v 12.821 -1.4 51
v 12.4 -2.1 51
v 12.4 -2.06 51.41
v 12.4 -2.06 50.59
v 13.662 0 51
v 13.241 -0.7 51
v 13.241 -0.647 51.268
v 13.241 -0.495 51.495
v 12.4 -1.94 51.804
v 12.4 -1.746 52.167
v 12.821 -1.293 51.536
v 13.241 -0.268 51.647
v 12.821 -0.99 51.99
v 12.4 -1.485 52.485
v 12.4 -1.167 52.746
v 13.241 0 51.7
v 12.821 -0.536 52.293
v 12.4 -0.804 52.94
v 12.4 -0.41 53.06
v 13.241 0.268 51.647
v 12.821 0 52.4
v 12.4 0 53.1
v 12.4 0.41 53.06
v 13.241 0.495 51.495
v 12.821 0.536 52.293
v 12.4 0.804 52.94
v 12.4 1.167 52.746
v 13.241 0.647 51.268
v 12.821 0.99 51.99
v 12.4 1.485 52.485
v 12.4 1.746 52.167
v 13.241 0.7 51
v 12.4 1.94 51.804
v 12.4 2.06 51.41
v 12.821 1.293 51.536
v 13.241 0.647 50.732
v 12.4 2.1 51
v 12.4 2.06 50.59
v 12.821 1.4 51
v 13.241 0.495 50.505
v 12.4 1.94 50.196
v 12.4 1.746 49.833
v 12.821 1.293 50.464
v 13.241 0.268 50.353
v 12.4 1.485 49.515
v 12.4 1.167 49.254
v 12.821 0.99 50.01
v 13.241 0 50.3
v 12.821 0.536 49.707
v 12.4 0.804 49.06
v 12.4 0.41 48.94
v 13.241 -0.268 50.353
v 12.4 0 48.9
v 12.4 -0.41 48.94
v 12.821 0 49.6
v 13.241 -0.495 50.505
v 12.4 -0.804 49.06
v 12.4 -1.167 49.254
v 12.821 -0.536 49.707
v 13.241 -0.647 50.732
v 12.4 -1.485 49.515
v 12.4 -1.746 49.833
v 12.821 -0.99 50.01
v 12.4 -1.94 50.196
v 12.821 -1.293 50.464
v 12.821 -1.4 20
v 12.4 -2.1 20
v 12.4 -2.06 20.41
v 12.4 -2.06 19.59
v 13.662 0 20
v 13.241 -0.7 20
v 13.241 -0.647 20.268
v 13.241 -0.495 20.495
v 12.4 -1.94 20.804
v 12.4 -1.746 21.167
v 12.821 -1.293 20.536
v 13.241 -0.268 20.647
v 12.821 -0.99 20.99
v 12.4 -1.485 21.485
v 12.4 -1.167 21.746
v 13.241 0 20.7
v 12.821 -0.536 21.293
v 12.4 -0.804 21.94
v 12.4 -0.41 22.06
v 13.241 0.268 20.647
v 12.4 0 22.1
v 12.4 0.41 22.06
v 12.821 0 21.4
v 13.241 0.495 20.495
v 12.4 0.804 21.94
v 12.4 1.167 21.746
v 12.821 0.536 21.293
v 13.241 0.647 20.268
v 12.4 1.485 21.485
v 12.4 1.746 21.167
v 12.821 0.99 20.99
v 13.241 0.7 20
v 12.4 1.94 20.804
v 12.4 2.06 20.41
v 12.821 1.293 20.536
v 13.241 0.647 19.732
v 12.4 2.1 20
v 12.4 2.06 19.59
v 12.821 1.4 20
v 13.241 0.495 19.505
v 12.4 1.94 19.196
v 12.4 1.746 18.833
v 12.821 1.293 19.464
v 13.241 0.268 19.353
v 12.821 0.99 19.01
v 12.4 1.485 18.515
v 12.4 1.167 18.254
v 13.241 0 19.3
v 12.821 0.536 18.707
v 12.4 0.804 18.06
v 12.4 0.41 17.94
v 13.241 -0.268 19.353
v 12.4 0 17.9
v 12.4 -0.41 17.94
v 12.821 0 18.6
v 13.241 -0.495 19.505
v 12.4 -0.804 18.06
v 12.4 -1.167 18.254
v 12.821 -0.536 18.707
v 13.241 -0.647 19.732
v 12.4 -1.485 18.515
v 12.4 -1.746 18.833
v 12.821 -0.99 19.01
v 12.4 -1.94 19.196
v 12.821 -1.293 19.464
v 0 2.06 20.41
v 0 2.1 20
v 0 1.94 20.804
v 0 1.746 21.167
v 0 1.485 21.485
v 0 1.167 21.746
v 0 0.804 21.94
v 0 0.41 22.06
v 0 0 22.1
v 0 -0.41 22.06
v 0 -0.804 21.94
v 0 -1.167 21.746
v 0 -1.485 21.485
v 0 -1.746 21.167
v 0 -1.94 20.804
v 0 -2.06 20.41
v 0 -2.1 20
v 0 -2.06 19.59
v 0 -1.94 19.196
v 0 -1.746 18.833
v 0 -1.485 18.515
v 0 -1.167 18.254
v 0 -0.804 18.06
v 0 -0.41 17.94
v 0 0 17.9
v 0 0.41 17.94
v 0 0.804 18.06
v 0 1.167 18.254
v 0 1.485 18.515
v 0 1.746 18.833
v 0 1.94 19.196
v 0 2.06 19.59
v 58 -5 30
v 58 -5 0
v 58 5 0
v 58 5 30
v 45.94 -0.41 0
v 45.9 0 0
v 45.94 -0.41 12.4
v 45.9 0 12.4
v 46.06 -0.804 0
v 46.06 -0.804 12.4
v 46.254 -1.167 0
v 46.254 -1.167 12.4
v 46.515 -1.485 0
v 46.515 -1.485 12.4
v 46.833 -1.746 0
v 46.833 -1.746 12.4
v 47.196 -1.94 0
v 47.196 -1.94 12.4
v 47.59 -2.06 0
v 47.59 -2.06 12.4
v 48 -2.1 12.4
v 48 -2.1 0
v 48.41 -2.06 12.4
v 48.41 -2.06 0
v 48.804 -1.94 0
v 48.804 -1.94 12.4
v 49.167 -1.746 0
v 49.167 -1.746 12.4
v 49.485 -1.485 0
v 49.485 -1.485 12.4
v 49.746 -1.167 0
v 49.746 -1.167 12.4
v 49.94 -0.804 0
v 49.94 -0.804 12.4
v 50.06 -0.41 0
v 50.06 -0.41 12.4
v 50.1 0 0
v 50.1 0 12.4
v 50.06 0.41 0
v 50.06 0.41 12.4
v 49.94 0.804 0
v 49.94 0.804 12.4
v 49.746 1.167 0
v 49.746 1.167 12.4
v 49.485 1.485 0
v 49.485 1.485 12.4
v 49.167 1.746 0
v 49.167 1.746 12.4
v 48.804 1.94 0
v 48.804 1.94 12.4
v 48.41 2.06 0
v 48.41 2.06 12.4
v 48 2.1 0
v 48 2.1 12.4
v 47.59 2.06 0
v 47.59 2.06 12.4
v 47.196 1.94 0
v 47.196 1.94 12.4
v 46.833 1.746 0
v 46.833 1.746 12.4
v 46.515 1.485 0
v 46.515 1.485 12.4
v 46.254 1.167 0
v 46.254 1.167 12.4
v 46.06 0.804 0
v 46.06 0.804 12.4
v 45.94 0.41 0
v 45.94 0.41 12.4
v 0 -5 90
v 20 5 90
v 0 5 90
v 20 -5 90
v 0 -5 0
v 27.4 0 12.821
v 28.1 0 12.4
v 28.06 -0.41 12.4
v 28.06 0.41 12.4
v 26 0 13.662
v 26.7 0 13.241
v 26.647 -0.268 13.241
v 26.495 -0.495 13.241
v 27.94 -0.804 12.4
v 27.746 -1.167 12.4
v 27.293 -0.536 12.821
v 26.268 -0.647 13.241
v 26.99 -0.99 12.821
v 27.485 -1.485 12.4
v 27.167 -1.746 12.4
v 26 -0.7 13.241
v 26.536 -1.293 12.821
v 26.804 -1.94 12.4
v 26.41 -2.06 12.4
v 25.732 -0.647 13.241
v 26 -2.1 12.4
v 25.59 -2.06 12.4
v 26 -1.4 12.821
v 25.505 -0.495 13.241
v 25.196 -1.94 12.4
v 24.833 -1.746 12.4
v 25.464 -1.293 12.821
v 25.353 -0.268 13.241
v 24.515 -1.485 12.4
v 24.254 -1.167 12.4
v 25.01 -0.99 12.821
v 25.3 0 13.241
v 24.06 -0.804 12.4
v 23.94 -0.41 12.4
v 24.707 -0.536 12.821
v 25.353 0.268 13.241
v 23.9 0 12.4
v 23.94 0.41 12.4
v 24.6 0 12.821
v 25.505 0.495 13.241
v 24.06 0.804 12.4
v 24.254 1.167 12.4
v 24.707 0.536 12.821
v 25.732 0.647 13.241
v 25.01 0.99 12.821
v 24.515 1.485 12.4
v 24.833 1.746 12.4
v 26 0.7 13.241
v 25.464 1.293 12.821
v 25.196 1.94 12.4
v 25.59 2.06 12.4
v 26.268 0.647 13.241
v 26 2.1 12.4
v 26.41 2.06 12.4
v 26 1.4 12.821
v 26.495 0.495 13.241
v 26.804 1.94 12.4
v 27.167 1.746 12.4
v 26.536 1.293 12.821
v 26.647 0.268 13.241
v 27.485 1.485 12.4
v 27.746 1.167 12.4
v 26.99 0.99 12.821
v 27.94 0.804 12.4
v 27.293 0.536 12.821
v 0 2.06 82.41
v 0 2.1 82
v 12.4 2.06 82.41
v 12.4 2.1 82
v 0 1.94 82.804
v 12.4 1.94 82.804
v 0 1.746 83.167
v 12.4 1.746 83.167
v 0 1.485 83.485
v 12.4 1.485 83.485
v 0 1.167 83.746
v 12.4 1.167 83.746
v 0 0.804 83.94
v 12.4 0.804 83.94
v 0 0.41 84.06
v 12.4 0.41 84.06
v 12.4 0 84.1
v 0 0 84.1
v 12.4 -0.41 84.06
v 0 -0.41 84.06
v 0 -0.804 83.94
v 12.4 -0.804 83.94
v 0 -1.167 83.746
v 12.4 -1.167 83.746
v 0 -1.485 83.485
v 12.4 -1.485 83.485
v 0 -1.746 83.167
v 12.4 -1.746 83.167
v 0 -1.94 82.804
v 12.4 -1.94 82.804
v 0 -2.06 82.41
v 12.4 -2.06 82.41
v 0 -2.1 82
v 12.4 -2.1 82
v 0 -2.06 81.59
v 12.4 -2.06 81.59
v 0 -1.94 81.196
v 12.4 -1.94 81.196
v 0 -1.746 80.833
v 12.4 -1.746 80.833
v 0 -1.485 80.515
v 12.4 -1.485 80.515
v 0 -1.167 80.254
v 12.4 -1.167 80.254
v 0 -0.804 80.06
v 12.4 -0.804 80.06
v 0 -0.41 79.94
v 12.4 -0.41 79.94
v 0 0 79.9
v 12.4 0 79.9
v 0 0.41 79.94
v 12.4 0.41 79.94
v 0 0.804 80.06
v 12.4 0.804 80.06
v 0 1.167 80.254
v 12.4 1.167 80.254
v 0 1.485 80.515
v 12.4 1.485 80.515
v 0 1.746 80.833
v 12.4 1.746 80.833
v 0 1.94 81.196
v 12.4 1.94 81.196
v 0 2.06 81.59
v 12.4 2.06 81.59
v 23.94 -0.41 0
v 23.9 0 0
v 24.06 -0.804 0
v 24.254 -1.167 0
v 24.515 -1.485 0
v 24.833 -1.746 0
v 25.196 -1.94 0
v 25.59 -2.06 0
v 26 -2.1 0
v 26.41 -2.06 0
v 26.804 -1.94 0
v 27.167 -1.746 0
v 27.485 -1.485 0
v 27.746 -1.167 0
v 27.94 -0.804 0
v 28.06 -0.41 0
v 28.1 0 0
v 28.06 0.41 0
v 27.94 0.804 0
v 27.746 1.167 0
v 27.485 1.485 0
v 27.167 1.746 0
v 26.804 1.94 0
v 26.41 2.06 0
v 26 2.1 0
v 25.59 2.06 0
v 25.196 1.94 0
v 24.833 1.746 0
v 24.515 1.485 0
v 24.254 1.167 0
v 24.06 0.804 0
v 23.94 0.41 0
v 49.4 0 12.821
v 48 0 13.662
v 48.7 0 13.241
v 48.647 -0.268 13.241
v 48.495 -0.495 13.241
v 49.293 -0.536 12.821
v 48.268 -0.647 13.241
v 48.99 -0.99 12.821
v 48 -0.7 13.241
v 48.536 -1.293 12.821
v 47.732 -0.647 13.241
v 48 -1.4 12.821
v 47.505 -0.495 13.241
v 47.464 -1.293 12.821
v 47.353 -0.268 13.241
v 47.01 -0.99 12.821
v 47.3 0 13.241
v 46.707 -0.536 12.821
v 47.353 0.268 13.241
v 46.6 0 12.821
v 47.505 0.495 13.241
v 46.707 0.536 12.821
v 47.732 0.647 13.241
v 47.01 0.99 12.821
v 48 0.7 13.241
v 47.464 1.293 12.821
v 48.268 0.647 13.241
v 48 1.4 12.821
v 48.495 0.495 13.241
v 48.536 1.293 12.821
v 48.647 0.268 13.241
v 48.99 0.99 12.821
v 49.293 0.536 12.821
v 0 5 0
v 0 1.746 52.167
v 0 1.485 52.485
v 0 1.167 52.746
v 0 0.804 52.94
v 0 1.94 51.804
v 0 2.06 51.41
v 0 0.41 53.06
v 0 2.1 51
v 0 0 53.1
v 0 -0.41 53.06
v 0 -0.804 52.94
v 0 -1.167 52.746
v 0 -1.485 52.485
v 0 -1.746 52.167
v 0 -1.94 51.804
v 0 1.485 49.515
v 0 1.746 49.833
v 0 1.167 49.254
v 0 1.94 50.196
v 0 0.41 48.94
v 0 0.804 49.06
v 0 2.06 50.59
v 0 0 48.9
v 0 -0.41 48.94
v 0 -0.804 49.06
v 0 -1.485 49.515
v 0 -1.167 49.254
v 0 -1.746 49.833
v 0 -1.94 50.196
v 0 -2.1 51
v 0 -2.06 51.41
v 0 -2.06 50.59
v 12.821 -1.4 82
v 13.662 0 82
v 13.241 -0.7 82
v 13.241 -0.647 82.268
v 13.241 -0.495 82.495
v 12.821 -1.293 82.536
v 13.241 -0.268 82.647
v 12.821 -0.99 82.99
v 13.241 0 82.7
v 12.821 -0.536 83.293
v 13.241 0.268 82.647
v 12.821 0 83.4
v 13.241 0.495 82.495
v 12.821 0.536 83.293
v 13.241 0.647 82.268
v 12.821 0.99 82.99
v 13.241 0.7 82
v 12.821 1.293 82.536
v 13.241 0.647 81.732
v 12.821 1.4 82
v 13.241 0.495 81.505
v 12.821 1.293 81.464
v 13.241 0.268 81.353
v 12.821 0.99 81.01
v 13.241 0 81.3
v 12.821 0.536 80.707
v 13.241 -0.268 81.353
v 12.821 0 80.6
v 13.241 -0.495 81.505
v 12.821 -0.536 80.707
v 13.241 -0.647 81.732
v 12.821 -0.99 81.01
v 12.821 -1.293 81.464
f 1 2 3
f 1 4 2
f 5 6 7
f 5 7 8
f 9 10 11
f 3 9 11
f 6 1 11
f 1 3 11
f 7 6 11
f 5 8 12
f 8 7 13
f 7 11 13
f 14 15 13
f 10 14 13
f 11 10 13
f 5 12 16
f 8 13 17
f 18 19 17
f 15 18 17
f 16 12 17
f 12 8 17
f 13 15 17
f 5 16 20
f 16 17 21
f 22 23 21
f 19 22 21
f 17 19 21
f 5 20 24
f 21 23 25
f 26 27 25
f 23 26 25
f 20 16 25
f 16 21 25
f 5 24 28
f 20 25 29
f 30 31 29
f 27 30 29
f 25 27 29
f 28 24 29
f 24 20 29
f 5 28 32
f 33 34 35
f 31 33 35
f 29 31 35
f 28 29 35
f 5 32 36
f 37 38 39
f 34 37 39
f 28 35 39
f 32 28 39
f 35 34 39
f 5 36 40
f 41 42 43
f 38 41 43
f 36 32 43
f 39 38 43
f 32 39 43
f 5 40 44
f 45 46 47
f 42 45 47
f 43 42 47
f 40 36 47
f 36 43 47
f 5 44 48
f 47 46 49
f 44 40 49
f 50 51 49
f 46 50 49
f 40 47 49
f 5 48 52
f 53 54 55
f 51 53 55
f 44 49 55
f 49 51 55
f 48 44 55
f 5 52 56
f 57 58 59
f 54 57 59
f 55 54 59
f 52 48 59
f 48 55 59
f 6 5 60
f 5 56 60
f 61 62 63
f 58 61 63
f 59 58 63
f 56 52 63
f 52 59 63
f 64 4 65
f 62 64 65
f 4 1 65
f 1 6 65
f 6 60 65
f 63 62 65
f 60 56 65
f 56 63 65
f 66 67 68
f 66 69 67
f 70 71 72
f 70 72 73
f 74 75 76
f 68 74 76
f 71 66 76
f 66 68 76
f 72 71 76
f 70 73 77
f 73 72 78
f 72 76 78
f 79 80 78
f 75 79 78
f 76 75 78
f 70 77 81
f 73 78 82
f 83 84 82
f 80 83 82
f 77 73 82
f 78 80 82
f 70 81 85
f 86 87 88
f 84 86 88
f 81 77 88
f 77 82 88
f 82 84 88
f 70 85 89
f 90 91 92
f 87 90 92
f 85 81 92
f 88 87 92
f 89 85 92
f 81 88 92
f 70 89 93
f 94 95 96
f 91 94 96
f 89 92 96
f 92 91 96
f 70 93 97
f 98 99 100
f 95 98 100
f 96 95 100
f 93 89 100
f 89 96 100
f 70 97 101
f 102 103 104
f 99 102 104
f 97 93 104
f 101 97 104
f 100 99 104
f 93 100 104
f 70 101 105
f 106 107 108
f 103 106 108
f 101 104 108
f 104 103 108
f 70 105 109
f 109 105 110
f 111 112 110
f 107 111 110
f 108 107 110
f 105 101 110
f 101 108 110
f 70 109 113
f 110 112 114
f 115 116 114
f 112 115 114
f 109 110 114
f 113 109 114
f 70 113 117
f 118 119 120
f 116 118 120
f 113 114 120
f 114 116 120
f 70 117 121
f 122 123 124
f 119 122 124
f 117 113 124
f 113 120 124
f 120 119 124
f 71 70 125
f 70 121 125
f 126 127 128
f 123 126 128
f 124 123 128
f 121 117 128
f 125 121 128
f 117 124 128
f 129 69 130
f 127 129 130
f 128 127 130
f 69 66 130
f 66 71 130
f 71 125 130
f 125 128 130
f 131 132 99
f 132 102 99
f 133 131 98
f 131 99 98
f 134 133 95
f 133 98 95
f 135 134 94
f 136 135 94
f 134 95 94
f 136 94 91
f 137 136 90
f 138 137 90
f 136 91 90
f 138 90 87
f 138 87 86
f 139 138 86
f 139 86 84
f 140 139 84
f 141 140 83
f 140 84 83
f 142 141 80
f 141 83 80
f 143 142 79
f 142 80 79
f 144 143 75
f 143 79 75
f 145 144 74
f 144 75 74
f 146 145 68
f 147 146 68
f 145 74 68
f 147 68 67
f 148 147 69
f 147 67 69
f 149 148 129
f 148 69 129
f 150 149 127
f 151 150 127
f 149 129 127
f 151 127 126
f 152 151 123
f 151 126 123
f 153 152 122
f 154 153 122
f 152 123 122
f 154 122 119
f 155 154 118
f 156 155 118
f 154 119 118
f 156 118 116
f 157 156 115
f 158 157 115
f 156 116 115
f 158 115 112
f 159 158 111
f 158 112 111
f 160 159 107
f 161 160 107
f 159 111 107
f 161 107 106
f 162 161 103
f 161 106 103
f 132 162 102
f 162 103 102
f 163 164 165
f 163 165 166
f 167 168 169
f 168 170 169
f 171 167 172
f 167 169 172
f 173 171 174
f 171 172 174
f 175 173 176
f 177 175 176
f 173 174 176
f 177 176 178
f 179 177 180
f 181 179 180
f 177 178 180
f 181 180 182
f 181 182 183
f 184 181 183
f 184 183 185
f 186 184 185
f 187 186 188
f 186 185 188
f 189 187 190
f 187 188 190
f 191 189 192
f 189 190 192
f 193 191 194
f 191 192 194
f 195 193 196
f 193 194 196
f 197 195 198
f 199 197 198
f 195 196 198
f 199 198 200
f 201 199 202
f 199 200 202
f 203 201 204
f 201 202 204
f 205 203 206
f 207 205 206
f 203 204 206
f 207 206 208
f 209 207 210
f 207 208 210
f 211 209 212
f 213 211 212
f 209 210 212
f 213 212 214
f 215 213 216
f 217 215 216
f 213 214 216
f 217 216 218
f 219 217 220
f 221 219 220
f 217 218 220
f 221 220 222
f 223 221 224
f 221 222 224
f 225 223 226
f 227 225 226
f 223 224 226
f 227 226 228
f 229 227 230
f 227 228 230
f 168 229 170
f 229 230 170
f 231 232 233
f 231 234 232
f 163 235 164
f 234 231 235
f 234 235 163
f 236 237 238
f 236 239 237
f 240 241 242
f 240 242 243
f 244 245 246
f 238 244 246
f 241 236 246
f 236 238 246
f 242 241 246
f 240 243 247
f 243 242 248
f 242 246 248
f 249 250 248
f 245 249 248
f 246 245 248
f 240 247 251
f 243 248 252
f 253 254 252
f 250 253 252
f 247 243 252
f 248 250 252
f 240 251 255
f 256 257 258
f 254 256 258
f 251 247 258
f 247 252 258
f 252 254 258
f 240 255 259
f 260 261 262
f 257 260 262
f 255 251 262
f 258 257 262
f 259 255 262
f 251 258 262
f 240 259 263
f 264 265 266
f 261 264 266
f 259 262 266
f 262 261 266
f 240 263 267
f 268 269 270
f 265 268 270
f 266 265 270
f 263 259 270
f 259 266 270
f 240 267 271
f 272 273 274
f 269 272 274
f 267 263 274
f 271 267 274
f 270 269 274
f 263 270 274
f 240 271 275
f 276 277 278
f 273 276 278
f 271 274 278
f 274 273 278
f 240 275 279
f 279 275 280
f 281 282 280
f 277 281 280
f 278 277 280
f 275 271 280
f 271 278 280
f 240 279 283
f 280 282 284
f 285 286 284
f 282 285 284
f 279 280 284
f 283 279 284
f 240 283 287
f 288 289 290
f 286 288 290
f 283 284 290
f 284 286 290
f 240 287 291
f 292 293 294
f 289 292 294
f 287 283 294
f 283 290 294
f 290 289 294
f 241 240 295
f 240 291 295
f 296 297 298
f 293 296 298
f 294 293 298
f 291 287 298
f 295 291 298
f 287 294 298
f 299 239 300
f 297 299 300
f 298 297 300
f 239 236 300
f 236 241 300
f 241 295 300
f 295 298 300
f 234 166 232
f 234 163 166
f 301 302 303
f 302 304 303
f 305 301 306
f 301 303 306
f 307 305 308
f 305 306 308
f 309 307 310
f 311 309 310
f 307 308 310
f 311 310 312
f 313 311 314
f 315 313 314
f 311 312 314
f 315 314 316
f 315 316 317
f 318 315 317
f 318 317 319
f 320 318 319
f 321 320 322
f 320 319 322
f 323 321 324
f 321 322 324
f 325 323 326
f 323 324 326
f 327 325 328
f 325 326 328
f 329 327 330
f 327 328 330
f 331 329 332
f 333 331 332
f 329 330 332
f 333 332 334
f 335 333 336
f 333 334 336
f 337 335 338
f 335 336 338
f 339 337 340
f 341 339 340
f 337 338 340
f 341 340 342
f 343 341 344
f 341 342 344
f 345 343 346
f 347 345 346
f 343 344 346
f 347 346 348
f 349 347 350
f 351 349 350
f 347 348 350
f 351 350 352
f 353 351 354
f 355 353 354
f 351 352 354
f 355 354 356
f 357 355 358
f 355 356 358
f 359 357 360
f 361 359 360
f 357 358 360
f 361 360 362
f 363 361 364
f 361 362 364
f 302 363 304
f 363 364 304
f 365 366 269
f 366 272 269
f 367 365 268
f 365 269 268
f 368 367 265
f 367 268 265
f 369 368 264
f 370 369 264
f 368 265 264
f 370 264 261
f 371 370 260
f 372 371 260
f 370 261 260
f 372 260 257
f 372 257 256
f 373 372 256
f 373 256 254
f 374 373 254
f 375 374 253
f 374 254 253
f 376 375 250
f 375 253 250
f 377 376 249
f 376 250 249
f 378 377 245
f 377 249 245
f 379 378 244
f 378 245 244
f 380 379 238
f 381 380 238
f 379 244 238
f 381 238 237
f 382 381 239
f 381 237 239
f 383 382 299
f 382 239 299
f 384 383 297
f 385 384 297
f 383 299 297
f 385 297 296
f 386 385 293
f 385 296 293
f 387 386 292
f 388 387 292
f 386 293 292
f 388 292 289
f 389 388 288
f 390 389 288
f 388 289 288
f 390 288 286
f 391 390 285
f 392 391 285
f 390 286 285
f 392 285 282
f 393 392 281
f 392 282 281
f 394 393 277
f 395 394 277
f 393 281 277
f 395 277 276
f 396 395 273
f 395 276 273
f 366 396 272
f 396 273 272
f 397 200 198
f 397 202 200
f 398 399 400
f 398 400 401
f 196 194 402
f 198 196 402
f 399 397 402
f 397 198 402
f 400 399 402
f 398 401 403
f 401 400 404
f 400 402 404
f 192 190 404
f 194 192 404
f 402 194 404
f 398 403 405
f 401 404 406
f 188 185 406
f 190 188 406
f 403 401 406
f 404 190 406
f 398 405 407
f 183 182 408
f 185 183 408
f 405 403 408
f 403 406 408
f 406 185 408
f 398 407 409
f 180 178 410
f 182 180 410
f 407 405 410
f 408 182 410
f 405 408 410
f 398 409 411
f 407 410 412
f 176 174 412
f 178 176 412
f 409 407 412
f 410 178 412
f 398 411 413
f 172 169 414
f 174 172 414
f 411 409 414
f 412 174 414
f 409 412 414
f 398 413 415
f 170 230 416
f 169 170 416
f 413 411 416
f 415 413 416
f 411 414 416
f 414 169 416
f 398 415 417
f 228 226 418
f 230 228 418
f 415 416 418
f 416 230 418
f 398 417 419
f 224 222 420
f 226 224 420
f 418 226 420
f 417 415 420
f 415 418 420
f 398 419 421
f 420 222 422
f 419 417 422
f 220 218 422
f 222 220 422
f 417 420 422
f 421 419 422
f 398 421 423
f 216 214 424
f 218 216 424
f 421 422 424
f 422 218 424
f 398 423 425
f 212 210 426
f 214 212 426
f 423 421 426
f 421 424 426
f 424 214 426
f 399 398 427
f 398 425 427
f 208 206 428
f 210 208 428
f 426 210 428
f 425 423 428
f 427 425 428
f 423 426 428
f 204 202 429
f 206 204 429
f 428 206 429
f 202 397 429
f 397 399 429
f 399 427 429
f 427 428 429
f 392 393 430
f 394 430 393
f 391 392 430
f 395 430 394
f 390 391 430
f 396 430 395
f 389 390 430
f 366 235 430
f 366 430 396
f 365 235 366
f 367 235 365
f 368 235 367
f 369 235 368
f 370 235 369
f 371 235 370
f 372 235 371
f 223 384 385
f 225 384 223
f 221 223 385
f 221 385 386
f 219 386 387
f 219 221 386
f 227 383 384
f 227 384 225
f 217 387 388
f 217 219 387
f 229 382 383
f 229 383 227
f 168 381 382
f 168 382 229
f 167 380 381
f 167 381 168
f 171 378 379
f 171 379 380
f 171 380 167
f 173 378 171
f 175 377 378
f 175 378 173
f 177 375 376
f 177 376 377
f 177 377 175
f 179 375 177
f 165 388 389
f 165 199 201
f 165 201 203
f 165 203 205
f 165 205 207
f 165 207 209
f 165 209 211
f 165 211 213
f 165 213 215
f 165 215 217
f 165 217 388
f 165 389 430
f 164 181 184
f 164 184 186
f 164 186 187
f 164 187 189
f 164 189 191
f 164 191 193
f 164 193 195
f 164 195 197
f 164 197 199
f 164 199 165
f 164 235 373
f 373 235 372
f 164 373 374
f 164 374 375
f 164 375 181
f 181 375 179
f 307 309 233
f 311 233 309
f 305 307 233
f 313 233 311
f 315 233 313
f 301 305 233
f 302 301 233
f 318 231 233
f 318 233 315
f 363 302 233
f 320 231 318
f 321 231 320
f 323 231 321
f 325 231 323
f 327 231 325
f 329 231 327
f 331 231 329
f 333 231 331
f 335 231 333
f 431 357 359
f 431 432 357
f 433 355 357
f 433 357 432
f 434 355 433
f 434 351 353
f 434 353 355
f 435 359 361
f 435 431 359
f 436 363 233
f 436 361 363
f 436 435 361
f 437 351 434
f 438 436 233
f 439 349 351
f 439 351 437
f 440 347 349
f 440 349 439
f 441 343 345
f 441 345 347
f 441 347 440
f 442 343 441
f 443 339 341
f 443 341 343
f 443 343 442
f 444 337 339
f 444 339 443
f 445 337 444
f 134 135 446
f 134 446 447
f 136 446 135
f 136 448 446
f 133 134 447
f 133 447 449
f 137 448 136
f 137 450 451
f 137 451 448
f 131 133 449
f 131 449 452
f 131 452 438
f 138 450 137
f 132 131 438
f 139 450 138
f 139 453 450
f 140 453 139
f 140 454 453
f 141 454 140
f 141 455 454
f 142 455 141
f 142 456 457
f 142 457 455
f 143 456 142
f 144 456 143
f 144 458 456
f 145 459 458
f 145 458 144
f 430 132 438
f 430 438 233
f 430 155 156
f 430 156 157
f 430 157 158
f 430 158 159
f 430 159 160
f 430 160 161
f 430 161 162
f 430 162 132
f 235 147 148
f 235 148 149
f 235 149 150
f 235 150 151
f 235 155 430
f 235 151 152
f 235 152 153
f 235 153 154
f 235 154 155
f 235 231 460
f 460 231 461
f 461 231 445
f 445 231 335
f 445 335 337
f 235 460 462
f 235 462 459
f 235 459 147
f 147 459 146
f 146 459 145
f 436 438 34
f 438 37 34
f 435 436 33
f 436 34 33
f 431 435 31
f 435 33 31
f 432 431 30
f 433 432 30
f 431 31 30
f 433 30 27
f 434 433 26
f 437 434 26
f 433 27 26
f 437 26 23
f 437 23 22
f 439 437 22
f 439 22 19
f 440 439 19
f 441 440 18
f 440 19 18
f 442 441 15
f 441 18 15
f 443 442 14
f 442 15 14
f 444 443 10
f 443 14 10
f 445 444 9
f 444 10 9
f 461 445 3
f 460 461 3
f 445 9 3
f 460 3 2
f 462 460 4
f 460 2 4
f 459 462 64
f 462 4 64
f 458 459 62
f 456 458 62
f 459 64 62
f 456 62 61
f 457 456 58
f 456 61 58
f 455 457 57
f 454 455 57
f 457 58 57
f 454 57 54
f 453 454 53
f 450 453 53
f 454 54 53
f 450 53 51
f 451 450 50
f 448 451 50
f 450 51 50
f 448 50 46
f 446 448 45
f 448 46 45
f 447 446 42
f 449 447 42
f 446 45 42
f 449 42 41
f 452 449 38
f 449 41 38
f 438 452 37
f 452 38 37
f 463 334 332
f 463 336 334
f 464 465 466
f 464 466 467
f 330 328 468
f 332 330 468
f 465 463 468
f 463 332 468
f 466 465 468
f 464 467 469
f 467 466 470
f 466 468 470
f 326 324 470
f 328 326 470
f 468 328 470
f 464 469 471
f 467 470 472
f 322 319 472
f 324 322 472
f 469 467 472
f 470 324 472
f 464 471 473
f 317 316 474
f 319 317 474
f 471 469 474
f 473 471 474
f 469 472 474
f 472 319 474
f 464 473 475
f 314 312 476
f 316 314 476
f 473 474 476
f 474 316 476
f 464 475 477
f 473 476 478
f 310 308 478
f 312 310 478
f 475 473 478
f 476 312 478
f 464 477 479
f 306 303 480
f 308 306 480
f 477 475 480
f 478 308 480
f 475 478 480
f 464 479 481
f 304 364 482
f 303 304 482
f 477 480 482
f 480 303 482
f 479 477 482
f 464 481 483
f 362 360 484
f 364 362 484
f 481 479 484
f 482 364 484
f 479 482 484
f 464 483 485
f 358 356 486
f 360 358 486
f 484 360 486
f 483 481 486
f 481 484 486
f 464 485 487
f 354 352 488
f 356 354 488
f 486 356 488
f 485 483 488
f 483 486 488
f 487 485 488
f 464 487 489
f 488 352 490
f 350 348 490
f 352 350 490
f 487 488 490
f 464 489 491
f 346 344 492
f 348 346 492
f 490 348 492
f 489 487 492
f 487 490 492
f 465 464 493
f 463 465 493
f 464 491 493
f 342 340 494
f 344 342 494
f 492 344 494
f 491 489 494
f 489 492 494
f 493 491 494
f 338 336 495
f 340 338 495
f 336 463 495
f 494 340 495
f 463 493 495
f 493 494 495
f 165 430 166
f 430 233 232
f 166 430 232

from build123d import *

# Parameters (mm, degrees)
F1_DEPTH = 5
F3_D     = 4.2
F3_DEPTH = 12.4
F3_TIP   = 1.2618073
F5_D     = 4.2
F5_DEPTH = 12.4
F5_TIP   = 1.2618073


# Not quite as in the source:
# - a feature names something its author has since deleted; it is built from what else it names


with BuildPart() as f1:
    # F0 (on Front) → F1 (new body, symmetric)
    with BuildSketch(Plane.XZ):
        Polygon((0, 90), (0, 0), (58, 0), (58, 30), (20, 90), align=None)
    extrude(amount=F1_DEPTH, both=True)

    # F3
    with Locations(Plane(origin=(0, 0, 0), x_dir=(1, 0, 0), z_dir=(0, 0, -1))):
        with Locations((26, 0), (48, 0)):
            Hole(F3_D / 2, depth=F3_DEPTH)
            with Locations((0, 0, -(F3_DEPTH + F3_TIP / 2))):  # 118° drill point
                Cone(0, F3_D / 2, F3_TIP, mode=Mode.SUBTRACT)

    # F5
    with Locations(Plane(origin=(0, 0, 0), x_dir=(0, -1, 0), z_dir=(-1, 0, 0))):
        with Locations((0, 20), (0, 82), (0, 51)):
            Hole(F5_D / 2, depth=F5_DEPTH)
            with Locations((0, 0, -(F5_DEPTH + F5_TIP / 2))):  # 118° drill point
                Cone(0, F5_D / 2, F5_TIP, mode=Mode.SUBTRACT)


solid = f1.part
